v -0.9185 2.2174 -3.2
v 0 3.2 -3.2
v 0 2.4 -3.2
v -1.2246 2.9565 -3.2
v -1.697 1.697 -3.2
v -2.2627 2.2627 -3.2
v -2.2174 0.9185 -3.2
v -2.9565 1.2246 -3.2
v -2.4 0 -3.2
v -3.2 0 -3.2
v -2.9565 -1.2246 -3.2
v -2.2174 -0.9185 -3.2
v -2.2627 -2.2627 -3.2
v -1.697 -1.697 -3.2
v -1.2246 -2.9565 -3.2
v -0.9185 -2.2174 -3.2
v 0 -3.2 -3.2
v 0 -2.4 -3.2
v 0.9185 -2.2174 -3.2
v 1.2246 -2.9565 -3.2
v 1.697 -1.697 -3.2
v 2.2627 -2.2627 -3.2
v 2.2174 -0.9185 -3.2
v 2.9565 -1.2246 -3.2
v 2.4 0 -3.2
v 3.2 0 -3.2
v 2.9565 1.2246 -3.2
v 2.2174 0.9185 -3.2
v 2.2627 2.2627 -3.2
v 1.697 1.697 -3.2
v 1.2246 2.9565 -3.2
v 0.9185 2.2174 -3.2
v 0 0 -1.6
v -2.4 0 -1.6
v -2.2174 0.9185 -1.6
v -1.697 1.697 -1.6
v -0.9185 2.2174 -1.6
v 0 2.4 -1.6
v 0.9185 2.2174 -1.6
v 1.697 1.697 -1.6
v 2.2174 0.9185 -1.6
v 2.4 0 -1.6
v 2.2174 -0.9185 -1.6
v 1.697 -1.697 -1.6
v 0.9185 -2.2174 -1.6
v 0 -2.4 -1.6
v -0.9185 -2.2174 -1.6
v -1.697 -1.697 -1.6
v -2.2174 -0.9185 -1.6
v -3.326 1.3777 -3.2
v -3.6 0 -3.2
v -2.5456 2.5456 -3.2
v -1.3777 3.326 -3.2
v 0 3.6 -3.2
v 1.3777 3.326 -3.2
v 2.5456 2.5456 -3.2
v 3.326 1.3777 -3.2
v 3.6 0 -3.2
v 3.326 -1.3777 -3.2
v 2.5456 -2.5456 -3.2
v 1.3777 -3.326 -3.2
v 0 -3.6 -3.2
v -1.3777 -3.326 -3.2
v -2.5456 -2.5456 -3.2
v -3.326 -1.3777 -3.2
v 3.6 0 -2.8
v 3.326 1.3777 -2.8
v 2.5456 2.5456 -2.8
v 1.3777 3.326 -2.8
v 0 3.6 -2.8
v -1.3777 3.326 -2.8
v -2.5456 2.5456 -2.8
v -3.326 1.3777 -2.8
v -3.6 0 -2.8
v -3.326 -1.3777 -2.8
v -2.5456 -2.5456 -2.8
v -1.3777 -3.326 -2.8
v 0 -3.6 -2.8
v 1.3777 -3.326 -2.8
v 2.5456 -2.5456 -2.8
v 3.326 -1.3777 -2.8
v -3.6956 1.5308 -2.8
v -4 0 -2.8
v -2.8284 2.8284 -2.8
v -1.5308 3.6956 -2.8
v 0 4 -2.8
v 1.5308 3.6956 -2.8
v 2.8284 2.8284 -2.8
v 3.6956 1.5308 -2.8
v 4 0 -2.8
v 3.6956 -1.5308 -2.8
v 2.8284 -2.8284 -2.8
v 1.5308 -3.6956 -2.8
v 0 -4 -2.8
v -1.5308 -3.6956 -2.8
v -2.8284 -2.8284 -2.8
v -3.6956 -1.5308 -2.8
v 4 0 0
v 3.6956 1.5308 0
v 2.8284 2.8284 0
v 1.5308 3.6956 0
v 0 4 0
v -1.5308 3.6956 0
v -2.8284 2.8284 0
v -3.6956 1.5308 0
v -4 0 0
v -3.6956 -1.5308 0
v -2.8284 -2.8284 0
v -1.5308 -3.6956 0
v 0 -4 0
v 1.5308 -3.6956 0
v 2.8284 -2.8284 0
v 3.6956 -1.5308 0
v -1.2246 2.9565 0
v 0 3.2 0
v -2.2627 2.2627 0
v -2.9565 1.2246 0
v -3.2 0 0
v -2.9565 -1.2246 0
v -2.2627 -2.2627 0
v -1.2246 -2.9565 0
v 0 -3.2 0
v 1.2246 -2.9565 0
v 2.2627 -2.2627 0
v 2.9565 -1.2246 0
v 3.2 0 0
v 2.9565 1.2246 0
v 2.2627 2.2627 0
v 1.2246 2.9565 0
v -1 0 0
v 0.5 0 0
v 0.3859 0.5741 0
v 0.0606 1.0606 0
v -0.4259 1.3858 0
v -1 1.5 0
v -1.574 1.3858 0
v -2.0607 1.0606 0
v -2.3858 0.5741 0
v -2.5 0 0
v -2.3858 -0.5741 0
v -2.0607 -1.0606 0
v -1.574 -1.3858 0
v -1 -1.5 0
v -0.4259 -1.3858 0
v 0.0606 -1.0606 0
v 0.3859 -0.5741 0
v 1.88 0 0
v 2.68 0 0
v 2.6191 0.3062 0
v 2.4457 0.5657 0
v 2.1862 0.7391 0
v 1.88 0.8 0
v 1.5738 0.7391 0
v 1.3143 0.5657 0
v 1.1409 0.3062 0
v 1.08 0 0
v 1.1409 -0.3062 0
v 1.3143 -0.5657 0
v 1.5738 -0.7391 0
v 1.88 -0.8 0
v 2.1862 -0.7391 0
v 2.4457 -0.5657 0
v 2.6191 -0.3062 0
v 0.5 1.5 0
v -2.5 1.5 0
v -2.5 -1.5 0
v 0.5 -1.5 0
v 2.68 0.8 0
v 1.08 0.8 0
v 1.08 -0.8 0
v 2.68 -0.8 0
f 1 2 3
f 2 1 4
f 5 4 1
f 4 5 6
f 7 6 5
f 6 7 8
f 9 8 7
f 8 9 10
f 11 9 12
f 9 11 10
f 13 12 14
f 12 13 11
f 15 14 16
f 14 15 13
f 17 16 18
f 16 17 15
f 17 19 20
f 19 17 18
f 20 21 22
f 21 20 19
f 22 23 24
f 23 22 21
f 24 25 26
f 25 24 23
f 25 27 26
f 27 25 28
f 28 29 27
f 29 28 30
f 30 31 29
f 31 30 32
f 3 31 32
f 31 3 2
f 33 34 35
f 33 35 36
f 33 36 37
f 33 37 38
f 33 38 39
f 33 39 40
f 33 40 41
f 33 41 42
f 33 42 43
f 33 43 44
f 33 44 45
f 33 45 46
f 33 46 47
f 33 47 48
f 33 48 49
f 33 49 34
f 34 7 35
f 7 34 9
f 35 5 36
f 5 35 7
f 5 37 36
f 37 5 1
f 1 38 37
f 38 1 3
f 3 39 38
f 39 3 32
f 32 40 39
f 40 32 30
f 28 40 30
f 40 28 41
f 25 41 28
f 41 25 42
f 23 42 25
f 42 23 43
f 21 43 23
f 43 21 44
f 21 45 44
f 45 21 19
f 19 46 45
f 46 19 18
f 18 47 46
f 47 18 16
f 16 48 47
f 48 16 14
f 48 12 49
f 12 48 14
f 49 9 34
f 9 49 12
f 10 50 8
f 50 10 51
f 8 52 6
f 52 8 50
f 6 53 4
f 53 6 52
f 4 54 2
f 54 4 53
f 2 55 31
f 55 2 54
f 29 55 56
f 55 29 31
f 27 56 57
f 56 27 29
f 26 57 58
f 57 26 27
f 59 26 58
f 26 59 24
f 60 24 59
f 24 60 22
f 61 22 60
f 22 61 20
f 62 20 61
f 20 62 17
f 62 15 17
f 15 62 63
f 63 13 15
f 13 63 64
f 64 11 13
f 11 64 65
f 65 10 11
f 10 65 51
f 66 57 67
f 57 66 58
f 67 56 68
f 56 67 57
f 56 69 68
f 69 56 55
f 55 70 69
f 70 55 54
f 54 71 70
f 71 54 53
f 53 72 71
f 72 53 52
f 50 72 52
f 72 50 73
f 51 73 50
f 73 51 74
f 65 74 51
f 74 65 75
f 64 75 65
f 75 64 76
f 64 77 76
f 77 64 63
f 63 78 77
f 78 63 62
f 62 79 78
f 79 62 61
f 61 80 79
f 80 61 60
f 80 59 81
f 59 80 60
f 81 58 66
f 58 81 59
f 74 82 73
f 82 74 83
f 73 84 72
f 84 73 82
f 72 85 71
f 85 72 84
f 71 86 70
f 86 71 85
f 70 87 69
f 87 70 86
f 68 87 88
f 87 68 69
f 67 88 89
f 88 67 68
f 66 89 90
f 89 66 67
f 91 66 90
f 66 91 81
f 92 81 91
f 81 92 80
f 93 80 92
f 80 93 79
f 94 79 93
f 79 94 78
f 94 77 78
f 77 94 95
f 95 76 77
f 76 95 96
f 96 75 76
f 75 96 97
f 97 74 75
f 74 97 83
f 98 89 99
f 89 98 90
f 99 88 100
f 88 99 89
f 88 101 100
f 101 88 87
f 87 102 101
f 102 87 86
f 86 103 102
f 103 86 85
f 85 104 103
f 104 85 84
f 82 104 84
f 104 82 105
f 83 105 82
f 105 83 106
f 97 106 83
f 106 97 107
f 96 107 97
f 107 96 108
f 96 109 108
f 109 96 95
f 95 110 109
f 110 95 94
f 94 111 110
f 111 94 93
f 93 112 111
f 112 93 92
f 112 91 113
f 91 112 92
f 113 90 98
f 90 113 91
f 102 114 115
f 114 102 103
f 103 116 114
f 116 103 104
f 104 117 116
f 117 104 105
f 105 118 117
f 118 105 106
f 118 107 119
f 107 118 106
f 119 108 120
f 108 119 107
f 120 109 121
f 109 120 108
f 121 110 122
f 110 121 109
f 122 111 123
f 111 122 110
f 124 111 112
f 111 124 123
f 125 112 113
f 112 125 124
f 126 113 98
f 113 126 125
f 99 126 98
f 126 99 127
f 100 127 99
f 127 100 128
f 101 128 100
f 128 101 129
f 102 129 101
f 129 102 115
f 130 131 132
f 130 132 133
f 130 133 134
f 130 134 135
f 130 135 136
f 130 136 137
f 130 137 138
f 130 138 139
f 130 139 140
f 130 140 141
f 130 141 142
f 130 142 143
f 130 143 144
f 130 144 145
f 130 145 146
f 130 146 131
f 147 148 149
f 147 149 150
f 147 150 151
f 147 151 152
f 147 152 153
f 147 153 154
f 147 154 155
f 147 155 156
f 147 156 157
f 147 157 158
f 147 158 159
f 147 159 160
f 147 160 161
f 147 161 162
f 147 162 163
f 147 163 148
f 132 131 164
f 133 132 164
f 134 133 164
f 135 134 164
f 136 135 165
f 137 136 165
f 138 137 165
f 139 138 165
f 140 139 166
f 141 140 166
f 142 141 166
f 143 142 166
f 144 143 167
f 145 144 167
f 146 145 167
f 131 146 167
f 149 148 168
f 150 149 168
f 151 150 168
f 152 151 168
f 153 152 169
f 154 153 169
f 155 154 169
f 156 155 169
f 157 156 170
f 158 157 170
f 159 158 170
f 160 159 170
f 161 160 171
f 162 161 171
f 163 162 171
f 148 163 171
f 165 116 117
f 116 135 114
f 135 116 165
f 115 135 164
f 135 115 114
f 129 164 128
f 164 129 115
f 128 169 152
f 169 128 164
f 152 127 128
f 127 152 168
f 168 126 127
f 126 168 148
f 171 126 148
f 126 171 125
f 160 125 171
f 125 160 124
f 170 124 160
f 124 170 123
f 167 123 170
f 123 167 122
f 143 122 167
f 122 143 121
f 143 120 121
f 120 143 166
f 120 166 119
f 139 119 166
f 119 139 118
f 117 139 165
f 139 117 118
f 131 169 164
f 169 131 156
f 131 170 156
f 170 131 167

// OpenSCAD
// file: ../p/4-4ring3.scad
use <../lib.scad>
function ldraw_lib__4_4ring3() = [
// 0 Ring  3 x 1.0
// 0 Name: 4-4ring3.dat
// 0 Author: James Jessiman
// 0 !LDRAW_ORG Primitive UPDATE 2009-01
// 0 !LICENSE Licensed under CC BY 4.0 : see CAreadme.txt
// 
// 0 BFC CERTIFY CCW
  [0,"BFC","CERTIFY"],
  [0,"BFC","CCW"],
// 
// 0 !HISTORY 1998-12-15 [PTadmin] Official Update 1998-10
// 0 !HISTORY 2002-04-05 [hafhead] Added BFC statement
// 0 !HISTORY 2002-04-25 [PTadmin] Official Update 2002-02
// 0 !HISTORY 2007-06-24 [PTadmin] Header formatted for Contributor Agreement
// 0 !HISTORY 2008-07-01 [PTadmin] Official Update 2008-01
// 0 !HISTORY 2008-08-26 [cwdee] Switch polygon winding and rename
// 0 !HISTORY 2009-05-02 [PTadmin] Official Update 2009-01
// 
// 
// 4 16 -1.5308 0 3.6956 -1.1481 0 2.7717 0 0 3 0 0 4
  [4,16,-1.5308,0,3.6956,-1.1481,0,2.7717,0,0,3,0,0,4],
// 4 16 -2.8284 0 2.8284 -2.1213 0 2.1213 -1.1481 0 2.7717 -1.5308 0 3.6956
  [4,16,-2.8284,0,2.8284,-2.1213,0,2.1213,-1.1481,0,2.7717,-1.5308,0,3.6956],
// 4 16 -3.6956 0 1.5308 -2.7717 0 1.1481 -2.1213 0 2.1213 -2.8284 0 2.8284
  [4,16,-3.6956,0,1.5308,-2.7717,0,1.1481,-2.1213,0,2.1213,-2.8284,0,2.8284],
// 4 16 -4 0 0 -3 0 0 -2.7717 0 1.1481 -3.6956 0 1.5308
  [4,16,-4,0,0,-3,0,0,-2.7717,0,1.1481,-3.6956,0,1.5308],
// 4 16 -3.6956 0 -1.5308 -2.7717 0 -1.1481 -3 0 0 -4 0 0
  [4,16,-3.6956,0,-1.5308,-2.7717,0,-1.1481,-3,0,0,-4,0,0],
// 4 16 -2.8284 0 -2.8284 -2.1213 0 -2.1213 -2.7717 0 -1.1481 -3.6956 0 -1.5308
  [4,16,-2.8284,0,-2.8284,-2.1213,0,-2.1213,-2.7717,0,-1.1481,-3.6956,0,-1.5308],
// 4 16 -1.5308 0 -3.6956 -1.1481 0 -2.7717 -2.1213 0 -2.1213 -2.8284 0 -2.8284
  [4,16,-1.5308,0,-3.6956,-1.1481,0,-2.7717,-2.1213,0,-2.1213,-2.8284,0,-2.8284],
// 4 16 0 0 -4 0 0 -3 -1.1481 0 -2.7717 -1.5308 0 -3.6956
  [4,16,0,0,-4,0,0,-3,-1.1481,0,-2.7717,-1.5308,0,-3.6956],
// 4 16 1.5308 0 -3.6956 1.1481 0 -2.7717 0 0 -3 0 0 -4
  [4,16,1.5308,0,-3.6956,1.1481,0,-2.7717,0,0,-3,0,0,-4],
// 4 16 2.8284 0 -2.8284 2.1213 0 -2.1213 1.1481 0 -2.7717 1.5308 0 -3.6956
  [4,16,2.8284,0,-2.8284,2.1213,0,-2.1213,1.1481,0,-2.7717,1.5308,0,-3.6956],
// 4 16 3.6956 0 -1.5308 2.7717 0 -1.1481 2.1213 0 -2.1213 2.8284 0 -2.8284
  [4,16,3.6956,0,-1.5308,2.7717,0,-1.1481,2.1213,0,-2.1213,2.8284,0,-2.8284],
// 4 16 4 0 0 3 0 0 2.7717 0 -1.1481 3.6956 0 -1.5308
  [4,16,4,0,0,3,0,0,2.7717,0,-1.1481,3.6956,0,-1.5308],
// 4 16 3.6956 0 1.5308 2.7717 0 1.1481 3 0 0 4 0 0
  [4,16,3.6956,0,1.5308,2.7717,0,1.1481,3,0,0,4,0,0],
// 4 16 2.8284 0 2.8284 2.1213 0 2.1213 2.7717 0 1.1481 3.6956 0 1.5308
  [4,16,2.8284,0,2.8284,2.1213,0,2.1213,2.7717,0,1.1481,3.6956,0,1.5308],
// 4 16 1.5308 0 3.6956 1.1481 0 2.7717 2.1213 0 2.1213 2.8284 0 2.8284
  [4,16,1.5308,0,3.6956,1.1481,0,2.7717,2.1213,0,2.1213,2.8284,0,2.8284],
// 4 16 0 0 4 0 0 3 1.1481 0 2.7717 1.5308 0 3.6956
  [4,16,0,0,4,0,0,3,1.1481,0,2.7717,1.5308,0,3.6956],
// 0
];
module ldraw_lib__4_4ring3(step=0, col=false, unit=2/5, alt=false, line=0.2, solid=!$preview)
    makepoly(ldraw_lib__4_4ring3(), step=step, col=col, unit=unit, alt=alt, line=line, solid=solid);
ldraw_lib__4_4ring3(line=0.2);
// file: ../p/4-4cylc.scad
use <../lib.scad>
use <4-4cyli.scad>
use <4-4disc.scad>
use <4-4edge.scad>
function ldraw_lib__4_4cylc() = [
// 0 Cylinder Closed 1.0
// 0 Name: 4-4cylc.dat
// 0 Author: Alex Taylor [anathema]
// 0 !LDRAW_ORG Primitive UPDATE 2009-02
// 0 !LICENSE Licensed under CC BY 4.0 : see CAreadme.txt
// 
// 0 BFC CERTIFY CCW
  [0,"BFC","CERTIFY"],
  [0,"BFC","CCW"],
// 
// 0 !HISTORY 2008-12-29 [cwdee] Removed one disc
// 0 !HISTORY 2009-09-03 [PTadmin] Official Update 2009-02
// 
// 
// 1 16 0 0 0 1 0 0 0 1 0 0 0 1 4-4edge.dat
  [1,16,0,0,0,1,0,0,0,1,0,0,0,1, ldraw_lib__4_4edge()],
// 1 16 0 1 0 1 0 0 0 1 0 0 0 1 4-4edge.dat
  [1,16,0,1,0,1,0,0,0,1,0,0,0,1, ldraw_lib__4_4edge()],
// 1 16 0 0 0 1 0 0 0 1 0 0 0 1 4-4disc.dat
  [1,16,0,0,0,1,0,0,0,1,0,0,0,1, ldraw_lib__4_4disc()],
// 1 16 0 0 0 1 0 0 0 1 0 0 0 1 4-4cyli.dat
  [1,16,0,0,0,1,0,0,0,1,0,0,0,1, ldraw_lib__4_4cyli()],
// 0
];
module ldraw_lib__4_4cylc(step=0, col=false, unit=2/5, alt=false, line=0.2, solid=!$preview)
    makepoly(ldraw_lib__4_4cylc(), step=step, col=col, unit=unit, alt=alt, line=line, solid=solid);
ldraw_lib__4_4cylc(line=0.2);
// file: ../p/4-4edge.scad
use <../lib.scad>
function ldraw_lib__4_4edge() = [
// 0 Circle 1.0
// 0 Name: 4-4edge.dat
// 0 Author: James Jessiman
// 0 !LDRAW_ORG Primitive UPDATE 2017-01
// 0 !LICENSE Licensed under CC BY 4.0 : see CAreadme.txt
// 
// 0 BFC CERTIFY CCW
  [0,"BFC","CERTIFY"],
  [0,"BFC","CCW"],
// 
// 0 !HISTORY 1998-12-15 [PTadmin] Official Update 1998-10
// 0 !HISTORY 2005-12-28 [PTadmin] Official Update 2005-01
// 0 !HISTORY 2007-06-24 [PTadmin] Header formatted for Contributor Agreement
// 0 !HISTORY 2008-07-01 [PTadmin] Official Update 2008-01
// 0 !HISTORY 2017-01-15 [Steffen] BFCed
// 0 !HISTORY 2017-12-30 [PTadmin] Official Update 2017-01
// 
// 
// 2 24 1 0 0 0.9239 0 0.3827
  [2,24,1,0,0,0.9239,0,0.3827],
// 2 24 0.9239 0 0.3827 0.7071 0 0.7071
  [2,24,0.9239,0,0.3827,0.7071,0,0.7071],
// 2 24 0.7071 0 0.7071 0.3827 0 0.9239
  [2,24,0.7071,0,0.7071,0.3827,0,0.9239],
// 2 24 0.3827 0 0.9239 0 0 1
  [2,24,0.3827,0,0.9239,0,0,1],
// 2 24 0 0 1 -0.3827 0 0.9239
  [2,24,0,0,1,-0.3827,0,0.9239],
// 2 24 -0.3827 0 0.9239 -0.7071 0 0.7071
  [2,24,-0.3827,0,0.9239,-0.7071,0,0.7071],
// 2 24 -0.7071 0 0.7071 -0.9239 0 0.3827
  [2,24,-0.7071,0,0.7071,-0.9239,0,0.3827],
// 2 24 -0.9239 0 0.3827 -1 0 -0
  [2,24,-0.9239,0,0.3827,-1,0,-0],
// 2 24 -1 0 -0 -0.9239 0 -0.3827
  [2,24,-1,0,-0,-0.9239,0,-0.3827],
// 2 24 -0.9239 0 -0.3827 -0.7071 0 -0.7071
  [2,24,-0.9239,0,-0.3827,-0.7071,0,-0.7071],
// 2 24 -0.7071 0 -0.7071 -0.3827 0 -0.9239
  [2,24,-0.7071,0,-0.7071,-0.3827,0,-0.9239],
// 2 24 -0.3827 0 -0.9239 0 0 -1
  [2,24,-0.3827,0,-0.9239,0,0,-1],
// 2 24 0 0 -1 0.3827 0 -0.9239
  [2,24,0,0,-1,0.3827,0,-0.9239],
// 2 24 0.3827 0 -0.9239 0.7071 0 -0.7071
  [2,24,0.3827,0,-0.9239,0.7071,0,-0.7071],
// 2 24 0.7071 0 -0.7071 0.9239 0 -0.3827
  [2,24,0.7071,0,-0.7071,0.9239,0,-0.3827],
// 2 24 0.9239 0 -0.3827 1 0 0
  [2,24,0.9239,0,-0.3827,1,0,0],
];
module ldraw_lib__4_4edge(step=0, col=false, unit=2/5, alt=false, line=0.2, solid=!$preview)
    makepoly(ldraw_lib__4_4edge(), step=step, col=col, unit=unit, alt=alt, line=line, solid=solid);
ldraw_lib__4_4edge(line=0.2);
// file: ../p/4-4cyli.scad
use <../lib.scad>
function ldraw_lib__4_4cyli() = [
// 0 Cylinder 1.0
// 0 Name: 4-4cyli.dat
// 0 Author: James Jessiman
// 0 !LDRAW_ORG Primitive UPDATE 2005-01
// 0 !LICENSE Licensed under CC BY 4.0 : see CAreadme.txt
// 
// 0 BFC CERTIFY CCW
  [0,"BFC","CERTIFY"],
  [0,"BFC","CCW"],
// 
// 0 !HISTORY 1998-12-15 [PTadmin] Official Update 1998-10
// 0 !HISTORY 2002-03-23 [sbliss] Added BFC statement; merged headers from files in distributions LDraw 0.27 and Complete.
// 0 !HISTORY 2002-04-25 [PTadmin] Official Update 2002-02
// 0 !HISTORY 2004-12-14 [guyvivan] BFC CCW
// 0 !HISTORY 2005-12-28 [PTadmin] Official Update 2005-01
// 0 !HISTORY 2007-06-24 [PTadmin] Header formatted for Contributor Agreement
// 0 !HISTORY 2008-07-01 [PTadmin] Official Update 2008-01
// 
// 
// 4 16 1 1 0 0.9239 1 0.3827 0.9239 0 0.3827 1 0 0
  [4,16,1,1,0,0.9239,1,0.3827,0.9239,0,0.3827,1,0,0],
// 5 24 1 0 0 1 1 0 0.9239 0 0.3827 0.9239 0 -0.3827
  [5,24,1,0,0,1,1,0,0.9239,0,0.3827,0.9239,0,-0.3827],
// 4 16 0.9239 1 0.3827 0.7071 1 0.7071 0.7071 0 0.7071 0.9239 0 0.3827
  [4,16,0.9239,1,0.3827,0.7071,1,0.7071,0.7071,0,0.7071,0.9239,0,0.3827],
// 5 24 0.9239 0 0.3827 0.9239 1 0.3827 0.7071 0 0.7071 1 0 0
  [5,24,0.9239,0,0.3827,0.9239,1,0.3827,0.7071,0,0.7071,1,0,0],
// 4 16 0.7071 1 0.7071 0.3827 1 0.9239 0.3827 0 0.9239 0.7071 0 0.7071
  [4,16,0.7071,1,0.7071,0.3827,1,0.9239,0.3827,0,0.9239,0.7071,0,0.7071],
// 5 24 0.7071 0 0.7071 0.7071 1 0.7071 0.3827 0 0.9239 0.9239 0 0.3827
  [5,24,0.7071,0,0.7071,0.7071,1,0.7071,0.3827,0,0.9239,0.9239,0,0.3827],
// 4 16 0.3827 1 0.9239 0 1 1 0 0 1 0.3827 0 0.9239
  [4,16,0.3827,1,0.9239,0,1,1,0,0,1,0.3827,0,0.9239],
// 5 24 0.3827 0 0.9239 0.3827 1 0.9239 0 0 1 0.7071 0 0.7071
  [5,24,0.3827,0,0.9239,0.3827,1,0.9239,0,0,1,0.7071,0,0.7071],
// 4 16 0 1 1 -0.3827 1 0.9239 -0.3827 0 0.9239 0 0 1
  [4,16,0,1,1,-0.3827,1,0.9239,-0.3827,0,0.9239,0,0,1],
// 5 24 0 0 1 0 1 1 -0.3827 0 0.9239 0.3827 0 0.9239
  [5,24,0,0,1,0,1,1,-0.3827,0,0.9239,0.3827,0,0.9239],
// 4 16 -0.3827 1 0.9239 -0.7071 1 0.7071 -0.7071 0 0.7071 -0.3827 0 0.9239
  [4,16,-0.3827,1,0.9239,-0.7071,1,0.7071,-0.7071,0,0.7071,-0.3827,0,0.9239],
// 5 24 -0.3827 0 0.9239 -0.3827 1 0.9239 -0.7071 0 0.7071 0 0 1
  [5,24,-0.3827,0,0.9239,-0.3827,1,0.9239,-0.7071,0,0.7071,0,0,1],
// 4 16 -0.7071 1 0.7071 -0.9239 1 0.3827 -0.9239 0 0.3827 -0.7071 0 0.7071
  [4,16,-0.7071,1,0.7071,-0.9239,1,0.3827,-0.9239,0,0.3827,-0.7071,0,0.7071],
// 5 24 -0.7071 0 0.7071 -0.7071 1 0.7071 -0.9239 0 0.3827 -0.3827 0 0.9239
  [5,24,-0.7071,0,0.7071,-0.7071,1,0.7071,-0.9239,0,0.3827,-0.3827,0,0.9239],
// 4 16 -0.9239 1 0.3827 -1 1 0 -1 0 0 -0.9239 0 0.3827
  [4,16,-0.9239,1,0.3827,-1,1,0,-1,0,0,-0.9239,0,0.3827],
// 5 24 -0.9239 0 0.3827 -0.9239 1 0.3827 -1 0 0 -0.7071 0 0.7071
  [5,24,-0.9239,0,0.3827,-0.9239,1,0.3827,-1,0,0,-0.7071,0,0.7071],
// 4 16 -1 1 0 -0.9239 1 -0.3827 -0.9239 0 -0.3827 -1 0 0
  [4,16,-1,1,0,-0.9239,1,-0.3827,-0.9239,0,-0.3827,-1,0,0],
// 5 24 -1 0 0 -1 1 0 -0.9239 0 -0.3827 -0.9239 0 0.3827
  [5,24,-1,0,0,-1,1,0,-0.9239,0,-0.3827,-0.9239,0,0.3827],
// 4 16 -0.9239 1 -0.3827 -0.7071 1 -0.7071 -0.7071 0 -0.7071 -0.9239 0 -0.3827
  [4,16,-0.9239,1,-0.3827,-0.7071,1,-0.7071,-0.7071,0,-0.7071,-0.9239,0,-0.3827],
// 5 24 -0.9239 0 -0.3827 -0.9239 1 -0.3827 -0.7071 0 -0.7071 -1 0 0
  [5,24,-0.9239,0,-0.3827,-0.9239,1,-0.3827,-0.7071,0,-0.7071,-1,0,0],
// 4 16 -0.7071 1 -0.7071 -0.3827 1 -0.9239 -0.3827 0 -0.9239 -0.7071 0 -0.7071
  [4,16,-0.7071,1,-0.7071,-0.3827,1,-0.9239,-0.3827,0,-0.9239,-0.7071,0,-0.7071],
// 5 24 -0.7071 0 -0.7071 -0.7071 1 -0.7071 -0.3827 0 -0.9239 -0.9239 0 -0.3827
  [5,24,-0.7071,0,-0.7071,-0.7071,1,-0.7071,-0.3827,0,-0.9239,-0.9239,0,-0.3827],
// 4 16 -0.3827 1 -0.9239 0 1 -1 0 0 -1 -0.3827 0 -0.9239
  [4,16,-0.3827,1,-0.9239,0,1,-1,0,0,-1,-0.3827,0,-0.9239],
// 5 24 -0.3827 0 -0.9239 -0.3827 1 -0.9239 0 0 -1 -0.7071 0 -0.7071
  [5,24,-0.3827,0,-0.9239,-0.3827,1,-0.9239,0,0,-1,-0.7071,0,-0.7071],
// 4 16 0 1 -1 0.3827 1 -0.9239 0.3827 0 -0.9239 0 0 -1
  [4,16,0,1,-1,0.3827,1,-0.9239,0.3827,0,-0.9239,0,0,-1],
// 5 24 0 0 -1 0 1 -1 0.3827 0 -0.9239 -0.3827 0 -0.9239
  [5,24,0,0,-1,0,1,-1,0.3827,0,-0.9239,-0.3827,0,-0.9239],
// 4 16 0.3827 1 -0.9239 0.7071 1 -0.7071 0.7071 0 -0.7071 0.3827 0 -0.9239
  [4,16,0.3827,1,-0.9239,0.7071,1,-0.7071,0.7071,0,-0.7071,0.3827,0,-0.9239],
// 5 24 0.3827 0 -0.9239 0.3827 1 -0.9239 0.7071 0 -0.7071 0 0 -1
  [5,24,0.3827,0,-0.9239,0.3827,1,-0.9239,0.7071,0,-0.7071,0,0,-1],
// 4 16 0.7071 1 -0.7071 0.9239 1 -0.3827 0.9239 0 -0.3827 0.7071 0 -0.7071
  [4,16,0.7071,1,-0.7071,0.9239,1,-0.3827,0.9239,0,-0.3827,0.7071,0,-0.7071],
// 5 24 0.7071 0 -0.7071 0.7071 1 -0.7071 0.9239 0 -0.3827 0.3827 0 -0.9239
  [5,24,0.7071,0,-0.7071,0.7071,1,-0.7071,0.9239,0,-0.3827,0.3827,0,-0.9239],
// 4 16 0.9239 1 -0.3827 1 1 0 1 0 0 0.9239 0 -0.3827
  [4,16,0.9239,1,-0.3827,1,1,0,1,0,0,0.9239,0,-0.3827],
// 5 24 0.9239 0 -0.3827 0.9239 1 -0.3827 1 0 0 0.7071 0 -0.7071
  [5,24,0.9239,0,-0.3827,0.9239,1,-0.3827,1,0,0,0.7071,0,-0.7071],
// 0
];
module ldraw_lib__4_4cyli(step=0, col=false, unit=2/5, alt=false, line=0.2, solid=!$preview)
    makepoly(ldraw_lib__4_4cyli(), step=step, col=col, unit=unit, alt=alt, line=line, solid=solid);
ldraw_lib__4_4cyli(line=0.2);
// file: ../p/empty.scad
use <../lib.scad>
function ldraw_lib__empty() = [
// 0 Empty
// 0 Name: empty.dat
// 0 Author: Steffen [Steffen]
// 0 !LDRAW_ORG Primitive UPDATE 2015-01
// 0 !LICENSE Licensed under CC BY 4.0 : see CAreadme.txt
// 
// 0 BFC CERTIFY CCW
  [0,"BFC","CERTIFY"],
  [0,"BFC","CCW"],
// 
// 0 !HISTORY 2015-10-11 [PTadmin] Official Update 2015-01
// 
// 
// 0 // Tool MLCad cannot handle really empty files. This file is used as a workaround.
// 0 // It exceptionally contains forbidden non-LDRAW standard syntax to satisfy MLCad until it is fixed OR a different editor has become the de-facto LDRAW standard.
// 0 // The line being used here is an "impossible" conditional line which never should be visible,
// 0 // additionally hidden by a syntax explicitly hiding it from displaying.
// 
// 0 MLCAD HIDE 5 24 0 0 0 0.0001 0 0 0.0001 -0.0001 0 0 0 0
];
module ldraw_lib__empty(step=0, col=false, unit=2/5, alt=false, line=0.2, solid=!$preview)
    makepoly(ldraw_lib__empty(), step=step, col=col, unit=unit, alt=alt, line=line, solid=solid);
ldraw_lib__empty(line=0.2);
// file: ../p/stud4o.scad
use <../lib.scad>
use <4-4cylc.scad>
use <4-4ring3.scad>
function ldraw_lib__stud4o() = [
// 0 Stud Tube Open without Outer Cylinder
// 0 Name: stud4o.dat
// 0 Author: Magnus Forsberg [MagFors]
// 0 !LDRAW_ORG Primitive UPDATE 2011-02
// 0 !LICENSE Licensed under CC BY 4.0 : see CAreadme.txt
// 
// 0 !HELP This stud is a "antistud" to be used like a underside stud,
// 0 !HELP but without the outer cylinder.
// 0 !HELP 1 47 0 0 0 1 0 0 0 1 0 0 0 1 stud4.dat
// 
// 0 BFC CERTIFY CCW
  [0,"BFC","CERTIFY"],
  [0,"BFC","CCW"],
// 
// 0 !HISTORY 2011-12-29 [PTadmin] Official Update 2011-02
// 
// 
// 1 16 0 -4 0 2 0 0 0 1 0 0 0 2 4-4ring3.dat
  [1,16,0,-4,0,2,0,0,0,1,0,0,0,2, ldraw_lib__4_4ring3()],
// 0 BFC INVERTNEXT
  [0,"BFC","INVERTNEXT"],
// 1 16 0 0 0 -6 0 0 0 -4 0 0 0 6 4-4cylc.dat
  [1,16,0,0,0,-6,0,0,0,-4,0,0,0,6, ldraw_lib__4_4cylc()],
];
module ldraw_lib__stud4o(step=0, col=false, unit=2/5, alt=false, line=0.2, solid=!$preview)
    makepoly(ldraw_lib__stud4o(), step=step, col=col, unit=unit, alt=alt, line=line, solid=solid);
ldraw_lib__stud4o(line=0.2);
// file: ../p/4-4ring9.scad
use <../lib.scad>
function ldraw_lib__4_4ring9() = [
// 0 Ring  9 x 1.0
// 0 Name: 4-4ring9.dat
// 0 Author: Magnus Forsberg [MagFors]
// 0 !LDRAW_ORG Primitive UPDATE 2024-01
// 0 !LICENSE Licensed under CC BY 4.0 : see CAreadme.txt
// 
// 0 BFC CERTIFY CCW
  [0,"BFC","CERTIFY"],
  [0,"BFC","CCW"],
// 
// 0 !HISTORY 2004-04-22 [PTadmin] Official Update 2004-02
// 0 !HISTORY 2007-06-24 [PTadmin] Header formatted for Contributor Agreement
// 0 !HISTORY 2008-07-01 [PTadmin] Official Update 2008-01
// 0 !HISTORY 2024-01-04 [MagFors] Complete regeneration, original by jriley
// 0 !HISTORY 2024-01-29 [OrionP] Official Update 2024-01
// 
// 4 16 10 0 0 9.239 0 3.827 8.3151 0 3.4443 9 0 0
  [4,16,10,0,0,9.239,0,3.827,8.3151,0,3.4443,9,0,0],
// 4 16 9.239 0 3.827 7.071 0 7.071 6.3639 0 6.3639 8.3151 0 3.4443
  [4,16,9.239,0,3.827,7.071,0,7.071,6.3639,0,6.3639,8.3151,0,3.4443],
// 4 16 7.071 0 7.071 3.827 0 9.239 3.4443 0 8.3151 6.3639 0 6.3639
  [4,16,7.071,0,7.071,3.827,0,9.239,3.4443,0,8.3151,6.3639,0,6.3639],
// 4 16 3.827 0 9.239 0 0 10 0 0 9 3.4443 0 8.3151
  [4,16,3.827,0,9.239,0,0,10,0,0,9,3.4443,0,8.3151],
// 4 16 0 0 10 -3.827 0 9.239 -3.4443 0 8.3151 0 0 9
  [4,16,0,0,10,-3.827,0,9.239,-3.4443,0,8.3151,0,0,9],
// 4 16 -3.827 0 9.239 -7.071 0 7.071 -6.3639 0 6.3639 -3.4443 0 8.3151
  [4,16,-3.827,0,9.239,-7.071,0,7.071,-6.3639,0,6.3639,-3.4443,0,8.3151],
// 4 16 -7.071 0 7.071 -9.239 0 3.827 -8.3151 0 3.4443 -6.3639 0 6.3639
  [4,16,-7.071,0,7.071,-9.239,0,3.827,-8.3151,0,3.4443,-6.3639,0,6.3639],
// 4 16 -9.239 0 3.827 -10 0 0 -9 0 0 -8.3151 0 3.4443
  [4,16,-9.239,0,3.827,-10,0,0,-9,0,0,-8.3151,0,3.4443],
// 4 16 -10 0 0 -9.239 0 -3.827 -8.3151 0 -3.4443 -9 0 0
  [4,16,-10,0,0,-9.239,0,-3.827,-8.3151,0,-3.4443,-9,0,0],
// 4 16 -9.239 0 -3.827 -7.071 0 -7.071 -6.3639 0 -6.3639 -8.3151 0 -3.4443
  [4,16,-9.239,0,-3.827,-7.071,0,-7.071,-6.3639,0,-6.3639,-8.3151,0,-3.4443],
// 4 16 -7.071 0 -7.071 -3.827 0 -9.239 -3.4443 0 -8.3151 -6.3639 0 -6.3639
  [4,16,-7.071,0,-7.071,-3.827,0,-9.239,-3.4443,0,-8.3151,-6.3639,0,-6.3639],
// 4 16 -3.827 0 -9.239 0 0 -10 0 0 -9 -3.4443 0 -8.3151
  [4,16,-3.827,0,-9.239,0,0,-10,0,0,-9,-3.4443,0,-8.3151],
// 4 16 0 0 -10 3.827 0 -9.239 3.4443 0 -8.3151 0 0 -9
  [4,16,0,0,-10,3.827,0,-9.239,3.4443,0,-8.3151,0,0,-9],
// 4 16 3.827 0 -9.239 7.071 0 -7.071 6.3639 0 -6.3639 3.4443 0 -8.3151
  [4,16,3.827,0,-9.239,7.071,0,-7.071,6.3639,0,-6.3639,3.4443,0,-8.3151],
// 4 16 7.071 0 -7.071 9.239 0 -3.827 8.3151 0 -3.4443 6.3639 0 -6.3639
  [4,16,7.071,0,-7.071,9.239,0,-3.827,8.3151,0,-3.4443,6.3639,0,-6.3639],
// 4 16 9.239 0 -3.827 10 0 0 9 0 0 8.3151 0 -3.4443
  [4,16,9.239,0,-3.827,10,0,0,9,0,0,8.3151,0,-3.4443],
// 0 // Build by LDPartEditor (PrimGen 2.X)
];
module ldraw_lib__4_4ring9(step=0, col=false, unit=2/5, alt=false, line=0.2, solid=!$preview)
    makepoly(ldraw_lib__4_4ring9(), step=step, col=col, unit=unit, alt=alt, line=line, solid=solid);
ldraw_lib__4_4ring9(line=0.2);
// file: ../p/4-4ring8.scad
use <../lib.scad>
function ldraw_lib__4_4ring8() = [
// 0 Ring  8 x 1.0
// 0 Name: 4-4ring8.dat
// 0 Author: Steffen [Steffen]
// 0 !LDRAW_ORG Primitive UPDATE 2012-01
// 0 !LICENSE Licensed under CC BY 4.0 : see CAreadme.txt
// 
// 0 BFC CERTIFY CCW
  [0,"BFC","CERTIFY"],
  [0,"BFC","CCW"],
// 
// 0 !HISTORY 2003-12-19 [PTadmin] Official Update 2003-03
// 0 !HISTORY 2007-06-24 [PTadmin] Header formatted for Contributor Agreement
// 0 !HISTORY 2008-07-01 [PTadmin] Official Update 2008-01
// 0 !HISTORY 2012-02-16 [Philo] Changed to CCW
// 0 !HISTORY 2012-03-30 [PTadmin] Official Update 2012-01
// 
// 
// 4 16 9 0 0 8.3151 0 3.4443 7.3912 0 3.0616 8 0 0
  [4,16,9,0,0,8.3151,0,3.4443,7.3912,0,3.0616,8,0,0],
// 4 16 8.3151 0 3.4443 6.3639 0 6.3639 5.6568 0 5.6568 7.3912 0 3.0616
  [4,16,8.3151,0,3.4443,6.3639,0,6.3639,5.6568,0,5.6568,7.3912,0,3.0616],
// 4 16 6.3639 0 6.3639 3.4443 0 8.3151 3.0616 0 7.3912 5.6568 0 5.6568
  [4,16,6.3639,0,6.3639,3.4443,0,8.3151,3.0616,0,7.3912,5.6568,0,5.6568],
// 4 16 3.4443 0 8.3151 0 0 9 0 0 8 3.0616 0 7.3912
  [4,16,3.4443,0,8.3151,0,0,9,0,0,8,3.0616,0,7.3912],
// 4 16 0 0 9 -3.4443 0 8.3151 -3.0616 0 7.3912 0 0 8
  [4,16,0,0,9,-3.4443,0,8.3151,-3.0616,0,7.3912,0,0,8],
// 4 16 -3.4443 0 8.3151 -6.3639 0 6.3639 -5.6568 0 5.6568 -3.0616 0 7.3912
  [4,16,-3.4443,0,8.3151,-6.3639,0,6.3639,-5.6568,0,5.6568,-3.0616,0,7.3912],
// 4 16 -6.3639 0 6.3639 -8.3151 0 3.4443 -7.3912 0 3.0616 -5.6568 0 5.6568
  [4,16,-6.3639,0,6.3639,-8.3151,0,3.4443,-7.3912,0,3.0616,-5.6568,0,5.6568],
// 4 16 -8.3151 0 3.4443 -9 0 0 -8 0 0 -7.3912 0 3.0616
  [4,16,-8.3151,0,3.4443,-9,0,0,-8,0,0,-7.3912,0,3.0616],
// 4 16 -9 0 0 -8.3151 0 -3.4443 -7.3912 0 -3.0616 -8 0 0
  [4,16,-9,0,0,-8.3151,0,-3.4443,-7.3912,0,-3.0616,-8,0,0],
// 4 16 -8.3151 0 -3.4443 -6.3639 0 -6.3639 -5.6568 0 -5.6568 -7.3912 0 -3.0616
  [4,16,-8.3151,0,-3.4443,-6.3639,0,-6.3639,-5.6568,0,-5.6568,-7.3912,0,-3.0616],
// 4 16 -6.3639 0 -6.3639 -3.4443 0 -8.3151 -3.0616 0 -7.3912 -5.6568 0 -5.6568
  [4,16,-6.3639,0,-6.3639,-3.4443,0,-8.3151,-3.0616,0,-7.3912,-5.6568,0,-5.6568],
// 4 16 -3.4443 0 -8.3151 0 0 -9 0 0 -8 -3.0616 0 -7.3912
  [4,16,-3.4443,0,-8.3151,0,0,-9,0,0,-8,-3.0616,0,-7.3912],
// 4 16 0 0 -9 3.4443 0 -8.3151 3.0616 0 -7.3912 0 0 -8
  [4,16,0,0,-9,3.4443,0,-8.3151,3.0616,0,-7.3912,0,0,-8],
// 4 16 3.4443 0 -8.3151 6.3639 0 -6.3639 5.6568 0 -5.6568 3.0616 0 -7.3912
  [4,16,3.4443,0,-8.3151,6.3639,0,-6.3639,5.6568,0,-5.6568,3.0616,0,-7.3912],
// 4 16 6.3639 0 -6.3639 8.3151 0 -3.4443 7.3912 0 -3.0616 5.6568 0 -5.6568
  [4,16,6.3639,0,-6.3639,8.3151,0,-3.4443,7.3912,0,-3.0616,5.6568,0,-5.6568],
// 4 16 8.3151 0 -3.4443 9 0 0 8 0 0 7.3912 0 -3.0616
  [4,16,8.3151,0,-3.4443,9,0,0,8,0,0,7.3912,0,-3.0616],
];
module ldraw_lib__4_4ring8(step=0, col=false, unit=2/5, alt=false, line=0.2, solid=!$preview)
    makepoly(ldraw_lib__4_4ring8(), step=step, col=col, unit=unit, alt=alt, line=line, solid=solid);
ldraw_lib__4_4ring8(line=0.2);
// file: ../p/4-4cylo.scad
use <../lib.scad>
use <4-4cyli.scad>
use <4-4edge.scad>
function ldraw_lib__4_4cylo() = [
// 0 Cylinder Open 1.0
// 0 Name: 4-4cylo.dat
// 0 Author: Mark Kennedy [mkennedy]
// 0 !LDRAW_ORG Primitive UPDATE 2010-01
// 0 !LICENSE Licensed under CC BY 4.0 : see CAreadme.txt
// 
// 0 BFC CERTIFY CCW
  [0,"BFC","CERTIFY"],
  [0,"BFC","CCW"],
// 
// 0 !HISTORY 2010-04-05 [PTadmin] Official Update 2010-01
// 
// 
// 1 16 0 0 0 1 0 0 0 1 0 0 0 1 4-4edge.dat
  [1,16,0,0,0,1,0,0,0,1,0,0,0,1, ldraw_lib__4_4edge()],
// 1 16 0 1 0 1 0 0 0 1 0 0 0 1 4-4edge.dat
  [1,16,0,1,0,1,0,0,0,1,0,0,0,1, ldraw_lib__4_4edge()],
// 1 16 0 0 0 1 0 0 0 1 0 0 0 1 4-4cyli.dat
  [1,16,0,0,0,1,0,0,0,1,0,0,0,1, ldraw_lib__4_4cyli()],
// 0
];
module ldraw_lib__4_4cylo(step=0, col=false, unit=2/5, alt=false, line=0.2, solid=!$preview)
    makepoly(ldraw_lib__4_4cylo(), step=step, col=col, unit=unit, alt=alt, line=line, solid=solid);
ldraw_lib__4_4cylo(line=0.2);
// file: ../p/1-16chrd.scad
use <../lib.scad>
use <empty.scad>
function ldraw_lib__1_16chrd() = [
// 0 Chord 0.0625
// 0 Name: 1-16chrd.dat
// 0 Author: Philippe Hurbain [Philo]
// 0 !LDRAW_ORG Primitive UPDATE 2015-01
// 0 !LICENSE Licensed under CC BY 4.0 : see CAreadme.txt
// 
// 0 BFC CERTIFY CCW
  [0,"BFC","CERTIFY"],
  [0,"BFC","CCW"],
// 
// 0 !HISTORY 2015-10-11 [PTadmin] Official Update 2015-01
// 
// 
// 0 // This file is intentionally empty because at the current \P resolution,
// 0 // an 1-16chrd is actually empty. However, this file still is present
// 0 // to allow tools to do primitives substition and fill in a real chrd here,
// 0 // or, if desired, to substitute this with the hi-res 48\1-16chrd.
// 
// 0 // This file is based on an idea by Darats at http://forums.ldraw.org/read.php?19,14500,14500#msg-14500
// 
// 1 16 0 0 0 1 0 0 0 1 0 0 0 1 empty.dat
  [1,16,0,0,0,1,0,0,0,1,0,0,0,1, ldraw_lib__empty()],
];
module ldraw_lib__1_16chrd(step=0, col=false, unit=2/5, alt=false, line=0.2, solid=!$preview)
    makepoly(ldraw_lib__1_16chrd(), step=step, col=col, unit=unit, alt=alt, line=line, solid=solid);
ldraw_lib__1_16chrd(line=0.2);
// file: s/98138s02.scad
use <../../lib.scad>
use <../../p/4-4cylo.scad>
use <../../p/4-4ring8.scad>
use <../../p/4-4ring9.scad>
use <../../p/stud4o.scad>
function ldraw_lib__s__98138s02() = [
// 0 ~Tile  1 x  1 Round with Groove without Complete Top Face
// 0 Name: s\98138s02.dat
// 0 Author: Magnus Forsberg [MagFors]
// 0 !LDRAW_ORG Subpart UPDATE 2020-01
// 0 !LICENSE Licensed under CC BY 4.0 : see CAreadme.txt
// 
// 0 BFC CERTIFY CCW
  [0,"BFC","CERTIFY"],
  [0,"BFC","CCW"],
// 
// 0 !HISTORY 2020-06-28 [PTadmin] Official Update 2020-01
// 
// 
// 1 16 0 4 0 1 0 0 0 -1 0 0 0 1 stud4o.dat
  [1,16,0,4,0,1,0,0,0,-1,0,0,0,1, ldraw_lib__stud4o()],
// 1 16 0 8 0 -1 0 0 0 -1 0 0 0 1 4-4ring8.dat
  [1,16,0,8,0,-1,0,0,0,-1,0,0,0,1, ldraw_lib__4_4ring8()],
// 1 16 0 7 0 9 0 0 0 1 0 0 0 9 4-4cylo.dat
  [1,16,0,7,0,9,0,0,0,1,0,0,0,9, ldraw_lib__4_4cylo()],
// 1 16 0 7 0 -1 0 0 0 -1 0 0 0 1 4-4ring9.dat
  [1,16,0,7,0,-1,0,0,0,-1,0,0,0,1, ldraw_lib__4_4ring9()],
// 1 16 0 0 0 10 0 0 0 7 0 0 0 10 4-4cylo.dat
  [1,16,0,0,0,10,0,0,0,7,0,0,0,10, ldraw_lib__4_4cylo()],
];
module ldraw_lib__s__98138s02(step=0, col=false, unit=2/5, alt=false, line=0.2, solid=!$preview)
    makepoly(ldraw_lib__s__98138s02(), step=step, col=col, unit=unit, alt=alt, line=line, solid=solid);
ldraw_lib__s__98138s02(line=0.2);
// file: ../p/4-4ring4.scad
use <../lib.scad>
function ldraw_lib__4_4ring4() = [
// 0 Ring  4 x 1.0
// 0 Name: 4-4ring4.dat
// 0 Author: James Jessiman
// 0 !LDRAW_ORG Primitive UPDATE 2009-01
// 0 !LICENSE Licensed under CC BY 4.0 : see CAreadme.txt
// 
// 0 BFC CERTIFY CCW
  [0,"BFC","CERTIFY"],
  [0,"BFC","CCW"],
// 
// 0 !HISTORY 1998-12-15 [PTadmin] Official Update 1998-10
// 0 !HISTORY 2002-04-08 [BrickCaster] Modified for BFC compliance
// 0 !HISTORY 2002-04-25 [PTadmin] Official Update 2002-02
// 0 !HISTORY 2007-06-24 [PTadmin] Header formatted for Contributor Agreement
// 0 !HISTORY 2008-07-01 [PTadmin] Official Update 2008-01
// 0 !HISTORY 2008-08-26 [cwdee] Switch polygon winding and rename
// 0 !HISTORY 2009-05-02 [PTadmin] Official Update 2009-01
// 
// 
// 4 16 -1.9135 0 4.6195 -1.5308 0 3.6956 0 0 4 0 0 5
  [4,16,-1.9135,0,4.6195,-1.5308,0,3.6956,0,0,4,0,0,5],
// 4 16 -3.5355 0 3.5355 -2.8284 0 2.8284 -1.5308 0 3.6956 -1.9135 0 4.6195
  [4,16,-3.5355,0,3.5355,-2.8284,0,2.8284,-1.5308,0,3.6956,-1.9135,0,4.6195],
// 4 16 -4.6195 0 1.9135 -3.6956 0 1.5308 -2.8284 0 2.8284 -3.5355 0 3.5355
  [4,16,-4.6195,0,1.9135,-3.6956,0,1.5308,-2.8284,0,2.8284,-3.5355,0,3.5355],
// 4 16 -5 0 0 -4 0 0 -3.6956 0 1.5308 -4.6195 0 1.9135
  [4,16,-5,0,0,-4,0,0,-3.6956,0,1.5308,-4.6195,0,1.9135],
// 4 16 -4.6195 0 -1.9135 -3.6956 0 -1.5308 -4 0 0 -5 0 0
  [4,16,-4.6195,0,-1.9135,-3.6956,0,-1.5308,-4,0,0,-5,0,0],
// 4 16 -3.5355 0 -3.5355 -2.8284 0 -2.8284 -3.6956 0 -1.5308 -4.6195 0 -1.9135
  [4,16,-3.5355,0,-3.5355,-2.8284,0,-2.8284,-3.6956,0,-1.5308,-4.6195,0,-1.9135],
// 4 16 -1.9135 0 -4.6195 -1.5308 0 -3.6956 -2.8284 0 -2.8284 -3.5355 0 -3.5355
  [4,16,-1.9135,0,-4.6195,-1.5308,0,-3.6956,-2.8284,0,-2.8284,-3.5355,0,-3.5355],
// 4 16 0 0 -5 0 0 -4 -1.5308 0 -3.6956 -1.9135 0 -4.6195
  [4,16,0,0,-5,0,0,-4,-1.5308,0,-3.6956,-1.9135,0,-4.6195],
// 4 16 1.9135 0 -4.6195 1.5308 0 -3.6956 0 0 -4 0 0 -5
  [4,16,1.9135,0,-4.6195,1.5308,0,-3.6956,0,0,-4,0,0,-5],
// 4 16 3.5355 0 -3.5355 2.8284 0 -2.8284 1.5308 0 -3.6956 1.9135 0 -4.6195
  [4,16,3.5355,0,-3.5355,2.8284,0,-2.8284,1.5308,0,-3.6956,1.9135,0,-4.6195],
// 4 16 4.6195 0 -1.9135 3.6956 0 -1.5308 2.8284 0 -2.8284 3.5355 0 -3.5355
  [4,16,4.6195,0,-1.9135,3.6956,0,-1.5308,2.8284,0,-2.8284,3.5355,0,-3.5355],
// 4 16 5 0 0 4 0 0 3.6956 0 -1.5308 4.6195 0 -1.9135
  [4,16,5,0,0,4,0,0,3.6956,0,-1.5308,4.6195,0,-1.9135],
// 4 16 4.6195 0 1.9135 3.6956 0 1.5308 4 0 0 5 0 0
  [4,16,4.6195,0,1.9135,3.6956,0,1.5308,4,0,0,5,0,0],
// 4 16 3.5355 0 3.5355 2.8284 0 2.8284 3.6956 0 1.5308 4.6195 0 1.9135
  [4,16,3.5355,0,3.5355,2.8284,0,2.8284,3.6956,0,1.5308,4.6195,0,1.9135],
// 4 16 1.9135 0 4.6195 1.5308 0 3.6956 2.8284 0 2.8284 3.5355 0 3.5355
  [4,16,1.9135,0,4.6195,1.5308,0,3.6956,2.8284,0,2.8284,3.5355,0,3.5355],
// 4 16 0 0 5 0 0 4 1.5308 0 3.6956 1.9135 0 4.6195
  [4,16,0,0,5,0,0,4,1.5308,0,3.6956,1.9135,0,4.6195],
// 0
];
module ldraw_lib__4_4ring4(step=0, col=false, unit=2/5, alt=false, line=0.2, solid=!$preview)
    makepoly(ldraw_lib__4_4ring4(), step=step, col=col, unit=unit, alt=alt, line=line, solid=solid);
ldraw_lib__4_4ring4(line=0.2);
// file: ../p/4-4ndis.scad
use <../lib.scad>
function ldraw_lib__4_4ndis() = [
// 0 Disc Negative 1.0
// 0 Name: 4-4ndis.dat
// 0 Author: James Jessiman
// 0 !LDRAW_ORG Primitive UPDATE 2012-01
// 0 !LICENSE Licensed under CC BY 4.0 : see CAreadme.txt
// 
// 0 BFC CERTIFY CCW
  [0,"BFC","CERTIFY"],
  [0,"BFC","CCW"],
// 
// 0 !HISTORY 2002-03-23 [sbliss] Added BFC statement; compacted code
// 0 !HISTORY 2002-04-25 [PTadmin] Official Update 2002-02
// 0 !HISTORY 2007-06-24 [PTadmin] Header formatted for Contributor Agreement
// 0 !HISTORY 2008-07-01 [PTadmin] Official Update 2008-01
// 0 !HISTORY 2012-02-16 [Philo] Changed to CCW
// 0 !HISTORY 2012-03-30 [PTadmin] Official Update 2012-01
// 
// 
// 3 16 0.9239 0 0.3827 1 0 0 1 0 1
  [3,16,0.9239,0,0.3827,1,0,0,1,0,1],
// 3 16 0.7071 0 0.7071 0.9239 0 0.3827 1 0 1
  [3,16,0.7071,0,0.7071,0.9239,0,0.3827,1,0,1],
// 3 16 0.3827 0 0.9239 0.7071 0 0.7071 1 0 1
  [3,16,0.3827,0,0.9239,0.7071,0,0.7071,1,0,1],
// 3 16 0 0 1 0.3827 0 0.9239 1 0 1
  [3,16,0,0,1,0.3827,0,0.9239,1,0,1],
// 3 16 -0.3827 0 0.9239 0 0 1 -1 0 1
  [3,16,-0.3827,0,0.9239,0,0,1,-1,0,1],
// 3 16 -0.7071 0 0.7071 -0.3827 0 0.9239 -1 0 1
  [3,16,-0.7071,0,0.7071,-0.3827,0,0.9239,-1,0,1],
// 3 16 -0.9239 0 0.3827 -0.7071 0 0.7071 -1 0 1
  [3,16,-0.9239,0,0.3827,-0.7071,0,0.7071,-1,0,1],
// 3 16 -1 0 0 -0.9239 0 0.3827 -1 0 1
  [3,16,-1,0,0,-0.9239,0,0.3827,-1,0,1],
// 3 16 -0.9239 0 -0.3827 -1 0 0 -1 0 -1
  [3,16,-0.9239,0,-0.3827,-1,0,0,-1,0,-1],
// 3 16 -0.7071 0 -0.7071 -0.9239 0 -0.3827 -1 0 -1
  [3,16,-0.7071,0,-0.7071,-0.9239,0,-0.3827,-1,0,-1],
// 3 16 -0.3827 0 -0.9239 -0.7071 0 -0.7071 -1 0 -1
  [3,16,-0.3827,0,-0.9239,-0.7071,0,-0.7071,-1,0,-1],
// 3 16 0 0 -1 -0.3827 0 -0.9239 -1 0 -1
  [3,16,0,0,-1,-0.3827,0,-0.9239,-1,0,-1],
// 3 16 0.3827 0 -0.9239 0 0 -1 1 0 -1
  [3,16,0.3827,0,-0.9239,0,0,-1,1,0,-1],
// 3 16 0.7071 0 -0.7071 0.3827 0 -0.9239 1 0 -1
  [3,16,0.7071,0,-0.7071,0.3827,0,-0.9239,1,0,-1],
// 3 16 0.9239 0 -0.3827 0.7071 0 -0.7071 1 0 -1
  [3,16,0.9239,0,-0.3827,0.7071,0,-0.7071,1,0,-1],
// 3 16 1 0 0 0.9239 0 -0.3827 1 0 -1
  [3,16,1,0,0,0.9239,0,-0.3827,1,0,-1],
];
module ldraw_lib__4_4ndis(step=0, col=false, unit=2/5, alt=false, line=0.2, solid=!$preview)
    makepoly(ldraw_lib__4_4ndis(), step=step, col=col, unit=unit, alt=alt, line=line, solid=solid);
ldraw_lib__4_4ndis(line=0.2);
// file: ../p/4-4ering.scad
use <../lib.scad>
use <1-16chrd.scad>
function ldraw_lib__4_4ering() = [
// 0 Adapter Ring Triangles to Normal 1.0
// 0 Name: 4-4ering.dat
// 0 Author: Philippe Hurbain [Philo]
// 0 !LDRAW_ORG Primitive UPDATE 2015-01
// 0 !LICENSE Licensed under CC BY 4.0 : see CAreadme.txt
// 
// 0 BFC CERTIFY CCW
  [0,"BFC","CERTIFY"],
  [0,"BFC","CCW"],
// 
// 0 !HISTORY 2015-10-11 [PTadmin] Official Update 2015-01
// 
// 
// 0 // This file uses 1-16chrd (actually empty). It allows
// 0 // tools to do primitives substition and fill in a ring of chrd here,
// 0 // or, if desired, to substitute this with the hi-res 48\1-16chrd.
// 0 // This file is based on an idea by Darats at http://forums.ldraw.org/read.php?19,14500,14500#msg-14500
// 
// 1 16 0 0 0 1 0 0 0 1 0 0 0 1 1-16chrd.dat
  [1,16,0,0,0,1,0,0,0,1,0,0,0,1, ldraw_lib__1_16chrd()],
// 1 16 0 0 0 0.92388 0 0.38268 0 1 0 -0.38268 0 0.92388 1-16chrd.dat
  [1,16,0,0,0,0.92388,0,0.38268,0,1,0,-0.38268,0,0.92388, ldraw_lib__1_16chrd()],
// 1 16 0 0 0 0.70711 0 0.70711 0 1 0 -0.70711 0 0.70711 1-16chrd.dat
  [1,16,0,0,0,0.70711,0,0.70711,0,1,0,-0.70711,0,0.70711, ldraw_lib__1_16chrd()],
// 1 16 0 0 0 0.38268 0 0.92388 0 1 0 -0.92388 0 0.38268 1-16chrd.dat
  [1,16,0,0,0,0.38268,0,0.92388,0,1,0,-0.92388,0,0.38268, ldraw_lib__1_16chrd()],
// 1 16 0 0 0 0 0 1 0 1 0 -1 0 0 1-16chrd.dat
  [1,16,0,0,0,0,0,1,0,1,0,-1,0,0, ldraw_lib__1_16chrd()],
// 1 16 0 0 0 -0.38268 0 0.92388 0 1 0 -0.92388 0 -0.38268 1-16chrd.dat
  [1,16,0,0,0,-0.38268,0,0.92388,0,1,0,-0.92388,0,-0.38268, ldraw_lib__1_16chrd()],
// 1 16 0 0 0 -0.70711 0 0.70711 0 1 0 -0.70711 0 -0.70711 1-16chrd.dat
  [1,16,0,0,0,-0.70711,0,0.70711,0,1,0,-0.70711,0,-0.70711, ldraw_lib__1_16chrd()],
// 1 16 0 0 0 -0.92388 0 0.38268 0 1 0 -0.38268 0 -0.92388 1-16chrd.dat
  [1,16,0,0,0,-0.92388,0,0.38268,0,1,0,-0.38268,0,-0.92388, ldraw_lib__1_16chrd()],
// 1 16 0 0 0 0 0 -1 0 1 0 1 0 0 1-16chrd.dat
  [1,16,0,0,0,0,0,-1,0,1,0,1,0,0, ldraw_lib__1_16chrd()],
// 1 16 0 0 0 0.38268 0 -0.92388 0 1 0 0.92388 0 0.38268 1-16chrd.dat
  [1,16,0,0,0,0.38268,0,-0.92388,0,1,0,0.92388,0,0.38268, ldraw_lib__1_16chrd()],
// 1 16 0 0 0 0.70711 0 -0.70711 0 1 0 0.70711 0 0.70711 1-16chrd.dat
  [1,16,0,0,0,0.70711,0,-0.70711,0,1,0,0.70711,0,0.70711, ldraw_lib__1_16chrd()],
// 1 16 0 0 0 0.92388 0 -0.38268 0 1 0 0.38268 0 0.92388 1-16chrd.dat
  [1,16,0,0,0,0.92388,0,-0.38268,0,1,0,0.38268,0,0.92388, ldraw_lib__1_16chrd()],
// 1 16 0 0 0 -1 0 0 0 1 0 0 0 -1 1-16chrd.dat
  [1,16,0,0,0,-1,0,0,0,1,0,0,0,-1, ldraw_lib__1_16chrd()],
// 1 16 0 0 0 -0.92388 0 -0.38268 0 1 0 0.38268 0 -0.92388 1-16chrd.dat
  [1,16,0,0,0,-0.92388,0,-0.38268,0,1,0,0.38268,0,-0.92388, ldraw_lib__1_16chrd()],
// 1 16 0 0 0 -0.70711 0 -0.70711 0 1 0 0.70711 0 -0.70711 1-16chrd.dat
  [1,16,0,0,0,-0.70711,0,-0.70711,0,1,0,0.70711,0,-0.70711, ldraw_lib__1_16chrd()],
// 1 16 0 0 0 -0.38268 0 -0.92388 0 1 0 0.92388 0 -0.38268 1-16chrd.dat
  [1,16,0,0,0,-0.38268,0,-0.92388,0,1,0,0.92388,0,-0.38268, ldraw_lib__1_16chrd()],
];
module ldraw_lib__4_4ering(step=0, col=false, unit=2/5, alt=false, line=0.2, solid=!$preview)
    makepoly(ldraw_lib__4_4ering(), step=step, col=col, unit=unit, alt=alt, line=line, solid=solid);
ldraw_lib__4_4ering(line=0.2);
// file: ../p/4-4disc.scad
use <../lib.scad>
function ldraw_lib__4_4disc() = [
// 0 Disc 1.0
// 0 Name: 4-4disc.dat
// 0 Author: James Jessiman
// 0 !LDRAW_ORG Primitive UPDATE 2002-02
// 0 !LICENSE Licensed under CC BY 4.0 : see CAreadme.txt
// 
// 0 BFC CERTIFY CCW
  [0,"BFC","CERTIFY"],
  [0,"BFC","CCW"],
// 
// 0 !HISTORY 1998-12-15 [PTadmin] Official Update 1998-10
// 0 !HISTORY 2002-03-23 [sbliss] Added BFC statement
// 0 !HISTORY 2002-04-25 [PTadmin] Official Update 2002-02
// 0 !HISTORY 2007-06-24 [PTadmin] Header formatted for Contributor Agreement
// 0 !HISTORY 2008-07-01 [PTadmin] Official Update 2008-01
// 
// 
// 3 16 0 0 0 1 0 0 0.9239 0 0.3827
  [3,16,0,0,0,1,0,0,0.9239,0,0.3827],
// 3 16 0 0 0 0.9239 0 0.3827 0.7071 0 0.7071
  [3,16,0,0,0,0.9239,0,0.3827,0.7071,0,0.7071],
// 3 16 0 0 0 0.7071 0 0.7071 0.3827 0 0.9239
  [3,16,0,0,0,0.7071,0,0.7071,0.3827,0,0.9239],
// 3 16 0 0 0 0.3827 0 0.9239 0 0 1
  [3,16,0,0,0,0.3827,0,0.9239,0,0,1],
// 3 16 0 0 0 0 0 1 -0.3827 0 0.9239
  [3,16,0,0,0,0,0,1,-0.3827,0,0.9239],
// 3 16 0 0 0 -0.3827 0 0.9239 -0.7071 0 0.7071
  [3,16,0,0,0,-0.3827,0,0.9239,-0.7071,0,0.7071],
// 3 16 0 0 0 -0.7071 0 0.7071 -0.9239 0 0.3827
  [3,16,0,0,0,-0.7071,0,0.7071,-0.9239,0,0.3827],
// 3 16 0 0 0 -0.9239 0 0.3827 -1 0 -0
  [3,16,0,0,0,-0.9239,0,0.3827,-1,0,-0],
// 3 16 0 0 0 -1 0 -0 -0.9239 0 -0.3827
  [3,16,0,0,0,-1,0,-0,-0.9239,0,-0.3827],
// 3 16 0 0 0 -0.9239 0 -0.3827 -0.7071 0 -0.7071
  [3,16,0,0,0,-0.9239,0,-0.3827,-0.7071,0,-0.7071],
// 3 16 0 0 0 -0.7071 0 -0.7071 -0.3827 0 -0.9239
  [3,16,0,0,0,-0.7071,0,-0.7071,-0.3827,0,-0.9239],
// 3 16 0 0 0 -0.3827 0 -0.9239 0 0 -1
  [3,16,0,0,0,-0.3827,0,-0.9239,0,0,-1],
// 3 16 0 0 0 0 0 -1 0.3827 0 -0.9239
  [3,16,0,0,0,0,0,-1,0.3827,0,-0.9239],
// 3 16 0 0 0 0.3827 0 -0.9239 0.7071 0 -0.7071
  [3,16,0,0,0,0.3827,0,-0.9239,0.7071,0,-0.7071],
// 3 16 0 0 0 0.7071 0 -0.7071 0.9239 0 -0.3827
  [3,16,0,0,0,0.7071,0,-0.7071,0.9239,0,-0.3827],
// 3 16 0 0 0 0.9239 0 -0.3827 1 0 0
  [3,16,0,0,0,0.9239,0,-0.3827,1,0,0],
// 0
];
module ldraw_lib__4_4disc(step=0, col=false, unit=2/5, alt=false, line=0.2, solid=!$preview)
    makepoly(ldraw_lib__4_4disc(), step=step, col=col, unit=unit, alt=alt, line=line, solid=solid);
ldraw_lib__4_4disc(line=0.2);
// main file
use <../lib.scad>
use <../p/4-4disc.scad>
use <../p/4-4ering.scad>
use <../p/4-4ndis.scad>
use <../p/4-4ring4.scad>
use <s/98138s02.scad>
function ldraw_lib__98138p2j() = [
// 0 Tile  1 x  1 Round with Two Circles Within a Black Circle Pattern
// 0 Name: 98138p2j.dat
// 0 Author: Vincent Messenet [Cheenzo]
// 0 !LDRAW_ORG Part UPDATE 2024-02
// 0 !LICENSE Licensed under CC BY 4.0 : see CAreadme.txt
// 
// 0 BFC CERTIFY CCW
  [0,"BFC","CERTIFY"],
  [0,"BFC","CCW"],
// 
// 0 !KEYWORDS BrickOwl 377592, Bricklink 98138pb367, Eye, Rebrickable 98138pr9981
// 0 !KEYWORDS Set 11027, Set 11028, Set 11031, Set 11033
// 
// 0 !HISTORY 2024-03-24 [OrionP] Official Update 2024-02
// 
// 
// 1 16 0 0 0 1 0 0 0 1 0 0 0 1 s\98138s02.dat
  [1,16,0,0,0,1,0,0,0,1,0,0,0,1, ldraw_lib__s__98138s02()],
// 1 16 0 0 0 2 0 0 0 1 0 0 0 2 4-4ring4.dat
  [1,16,0,0,0,2,0,0,0,1,0,0,0,2, ldraw_lib__4_4ring4()],
// 1 0 0 0 0 8 0 0 0 1 0 0 0 8 4-4ering.dat
  [1,0,0,0,0,8,0,0,0,1,0,0,0,8, ldraw_lib__4_4ering()],
// 1 16 -2.5 0 0 3.75 0 0 0 1 0 0 0 3.75 4-4disc.dat
  [1,16,-2.5,0,0,3.75,0,0,0,1,0,0,0,3.75, ldraw_lib__4_4disc()],
// 1 16 4.7 0 0 2 0 0 0 1 0 0 0 2 4-4disc.dat
  [1,16,4.7,0,0,2,0,0,0,1,0,0,0,2, ldraw_lib__4_4disc()],
// 1 0 -2.5 0 0 3.75 0 0 0 1 0 0 0 3.75 4-4ndis.dat
  [1,0,-2.5,0,0,3.75,0,0,0,1,0,0,0,3.75, ldraw_lib__4_4ndis()],
// 1 0 4.7 0 0 2 0 0 0 1 0 0 0 2 4-4ndis.dat
  [1,0,4.7,0,0,2,0,0,0,1,0,0,0,2, ldraw_lib__4_4ndis()],
// 3 0 -6.25 0 3.75 -5.6568 0 5.6568 -7.3912 0 3.0616
  [3,0,-6.25,0,3.75,-5.6568,0,5.6568,-7.3912,0,3.0616],
// 4 0 -3.0616 0 7.3912 -5.6568 0 5.6568 -6.25 0 3.75 -2.5 0 3.75
  [4,0,-3.0616,0,7.3912,-5.6568,0,5.6568,-6.25,0,3.75,-2.5,0,3.75],
// 4 0 -3.0616 0 7.3912 -2.5 0 3.75 1.25 0 3.75 0 0 8
  [4,0,-3.0616,0,7.3912,-2.5,0,3.75,1.25,0,3.75,0,0,8],
// 4 0 3.0616 0 7.3912 0 0 8 1.25 0 3.75 5.6568 0 5.6568
  [4,0,3.0616,0,7.3912,0,0,8,1.25,0,3.75,5.6568,0,5.6568],
// 4 0 4.7 0 2 5.6568 0 5.6568 1.25 0 3.75 2.7 0 2
  [4,0,4.7,0,2,5.6568,0,5.6568,1.25,0,3.75,2.7,0,2],
// 4 0 5.6568 0 5.6568 4.7 0 2 6.7 0 2 7.3912 0 3.0616
  [4,0,5.6568,0,5.6568,4.7,0,2,6.7,0,2,7.3912,0,3.0616],
// 4 0 6.7 0 0 8 0 0 7.3912 0 3.0616 6.7 0 2
  [4,0,6.7,0,0,8,0,0,7.3912,0,3.0616,6.7,0,2],
// 4 0 7.3912 0 -3.0616 8 0 0 6.7 0 0 6.7 0 -2
  [4,0,7.3912,0,-3.0616,8,0,0,6.7,0,0,6.7,0,-2],
// 4 0 4.7 0 -2 5.6568 0 -5.6568 7.3912 0 -3.0616 6.7 0 -2
  [4,0,4.7,0,-2,5.6568,0,-5.6568,7.3912,0,-3.0616,6.7,0,-2],
// 4 0 3.0616 0 -7.3912 5.6568 0 -5.6568 4.7 0 -2 2.7 0 -2
  [4,0,3.0616,0,-7.3912,5.6568,0,-5.6568,4.7,0,-2,2.7,0,-2],
// 4 0 3.0616 0 -7.3912 2.7 0 -2 1.25 0 -3.75 0 0 -8
  [4,0,3.0616,0,-7.3912,2.7,0,-2,1.25,0,-3.75,0,0,-8],
// 4 0 0 0 -8 1.25 0 -3.75 -2.5 0 -3.75 -3.0616 0 -7.3912
  [4,0,0,0,-8,1.25,0,-3.75,-2.5,0,-3.75,-3.0616,0,-7.3912],
// 4 0 -5.6568 0 -5.6568 -3.0616 0 -7.3912 -2.5 0 -3.75 -6.25 0 -3.75
  [4,0,-5.6568,0,-5.6568,-3.0616,0,-7.3912,-2.5,0,-3.75,-6.25,0,-3.75],
// 3 0 -5.6568 0 -5.6568 -6.25 0 -3.75 -7.3912 0 -3.0616
  [3,0,-5.6568,0,-5.6568,-6.25,0,-3.75,-7.3912,0,-3.0616],
// 4 0 -8 0 0 -7.3912 0 -3.0616 -6.25 0 -3.75 -6.25 0 0
  [4,0,-8,0,0,-7.3912,0,-3.0616,-6.25,0,-3.75,-6.25,0,0],
// 4 0 -7.3912 0 3.0616 -8 0 0 -6.25 0 0 -6.25 0 3.75
  [4,0,-7.3912,0,3.0616,-8,0,0,-6.25,0,0,-6.25,0,3.75],
// 4 0 2.7 0 0 2.7 0 2 1.25 0 3.75 1.25 0 0
  [4,0,2.7,0,0,2.7,0,2,1.25,0,3.75,1.25,0,0],
// 4 0 2.7 0 -2 2.7 0 0 1.25 0 0 1.25 0 -3.75
  [4,0,2.7,0,-2,2.7,0,0,1.25,0,0,1.25,0,-3.75],
];
module ldraw_lib__98138p2j(step=0, col=false, unit=2/5, alt=false, line=0.2, solid=!$preview)
    makepoly(ldraw_lib__98138p2j(), step=step, col=col, unit=unit, alt=alt, line=line, solid=solid);
ldraw_lib__98138p2j(line=0.2);
